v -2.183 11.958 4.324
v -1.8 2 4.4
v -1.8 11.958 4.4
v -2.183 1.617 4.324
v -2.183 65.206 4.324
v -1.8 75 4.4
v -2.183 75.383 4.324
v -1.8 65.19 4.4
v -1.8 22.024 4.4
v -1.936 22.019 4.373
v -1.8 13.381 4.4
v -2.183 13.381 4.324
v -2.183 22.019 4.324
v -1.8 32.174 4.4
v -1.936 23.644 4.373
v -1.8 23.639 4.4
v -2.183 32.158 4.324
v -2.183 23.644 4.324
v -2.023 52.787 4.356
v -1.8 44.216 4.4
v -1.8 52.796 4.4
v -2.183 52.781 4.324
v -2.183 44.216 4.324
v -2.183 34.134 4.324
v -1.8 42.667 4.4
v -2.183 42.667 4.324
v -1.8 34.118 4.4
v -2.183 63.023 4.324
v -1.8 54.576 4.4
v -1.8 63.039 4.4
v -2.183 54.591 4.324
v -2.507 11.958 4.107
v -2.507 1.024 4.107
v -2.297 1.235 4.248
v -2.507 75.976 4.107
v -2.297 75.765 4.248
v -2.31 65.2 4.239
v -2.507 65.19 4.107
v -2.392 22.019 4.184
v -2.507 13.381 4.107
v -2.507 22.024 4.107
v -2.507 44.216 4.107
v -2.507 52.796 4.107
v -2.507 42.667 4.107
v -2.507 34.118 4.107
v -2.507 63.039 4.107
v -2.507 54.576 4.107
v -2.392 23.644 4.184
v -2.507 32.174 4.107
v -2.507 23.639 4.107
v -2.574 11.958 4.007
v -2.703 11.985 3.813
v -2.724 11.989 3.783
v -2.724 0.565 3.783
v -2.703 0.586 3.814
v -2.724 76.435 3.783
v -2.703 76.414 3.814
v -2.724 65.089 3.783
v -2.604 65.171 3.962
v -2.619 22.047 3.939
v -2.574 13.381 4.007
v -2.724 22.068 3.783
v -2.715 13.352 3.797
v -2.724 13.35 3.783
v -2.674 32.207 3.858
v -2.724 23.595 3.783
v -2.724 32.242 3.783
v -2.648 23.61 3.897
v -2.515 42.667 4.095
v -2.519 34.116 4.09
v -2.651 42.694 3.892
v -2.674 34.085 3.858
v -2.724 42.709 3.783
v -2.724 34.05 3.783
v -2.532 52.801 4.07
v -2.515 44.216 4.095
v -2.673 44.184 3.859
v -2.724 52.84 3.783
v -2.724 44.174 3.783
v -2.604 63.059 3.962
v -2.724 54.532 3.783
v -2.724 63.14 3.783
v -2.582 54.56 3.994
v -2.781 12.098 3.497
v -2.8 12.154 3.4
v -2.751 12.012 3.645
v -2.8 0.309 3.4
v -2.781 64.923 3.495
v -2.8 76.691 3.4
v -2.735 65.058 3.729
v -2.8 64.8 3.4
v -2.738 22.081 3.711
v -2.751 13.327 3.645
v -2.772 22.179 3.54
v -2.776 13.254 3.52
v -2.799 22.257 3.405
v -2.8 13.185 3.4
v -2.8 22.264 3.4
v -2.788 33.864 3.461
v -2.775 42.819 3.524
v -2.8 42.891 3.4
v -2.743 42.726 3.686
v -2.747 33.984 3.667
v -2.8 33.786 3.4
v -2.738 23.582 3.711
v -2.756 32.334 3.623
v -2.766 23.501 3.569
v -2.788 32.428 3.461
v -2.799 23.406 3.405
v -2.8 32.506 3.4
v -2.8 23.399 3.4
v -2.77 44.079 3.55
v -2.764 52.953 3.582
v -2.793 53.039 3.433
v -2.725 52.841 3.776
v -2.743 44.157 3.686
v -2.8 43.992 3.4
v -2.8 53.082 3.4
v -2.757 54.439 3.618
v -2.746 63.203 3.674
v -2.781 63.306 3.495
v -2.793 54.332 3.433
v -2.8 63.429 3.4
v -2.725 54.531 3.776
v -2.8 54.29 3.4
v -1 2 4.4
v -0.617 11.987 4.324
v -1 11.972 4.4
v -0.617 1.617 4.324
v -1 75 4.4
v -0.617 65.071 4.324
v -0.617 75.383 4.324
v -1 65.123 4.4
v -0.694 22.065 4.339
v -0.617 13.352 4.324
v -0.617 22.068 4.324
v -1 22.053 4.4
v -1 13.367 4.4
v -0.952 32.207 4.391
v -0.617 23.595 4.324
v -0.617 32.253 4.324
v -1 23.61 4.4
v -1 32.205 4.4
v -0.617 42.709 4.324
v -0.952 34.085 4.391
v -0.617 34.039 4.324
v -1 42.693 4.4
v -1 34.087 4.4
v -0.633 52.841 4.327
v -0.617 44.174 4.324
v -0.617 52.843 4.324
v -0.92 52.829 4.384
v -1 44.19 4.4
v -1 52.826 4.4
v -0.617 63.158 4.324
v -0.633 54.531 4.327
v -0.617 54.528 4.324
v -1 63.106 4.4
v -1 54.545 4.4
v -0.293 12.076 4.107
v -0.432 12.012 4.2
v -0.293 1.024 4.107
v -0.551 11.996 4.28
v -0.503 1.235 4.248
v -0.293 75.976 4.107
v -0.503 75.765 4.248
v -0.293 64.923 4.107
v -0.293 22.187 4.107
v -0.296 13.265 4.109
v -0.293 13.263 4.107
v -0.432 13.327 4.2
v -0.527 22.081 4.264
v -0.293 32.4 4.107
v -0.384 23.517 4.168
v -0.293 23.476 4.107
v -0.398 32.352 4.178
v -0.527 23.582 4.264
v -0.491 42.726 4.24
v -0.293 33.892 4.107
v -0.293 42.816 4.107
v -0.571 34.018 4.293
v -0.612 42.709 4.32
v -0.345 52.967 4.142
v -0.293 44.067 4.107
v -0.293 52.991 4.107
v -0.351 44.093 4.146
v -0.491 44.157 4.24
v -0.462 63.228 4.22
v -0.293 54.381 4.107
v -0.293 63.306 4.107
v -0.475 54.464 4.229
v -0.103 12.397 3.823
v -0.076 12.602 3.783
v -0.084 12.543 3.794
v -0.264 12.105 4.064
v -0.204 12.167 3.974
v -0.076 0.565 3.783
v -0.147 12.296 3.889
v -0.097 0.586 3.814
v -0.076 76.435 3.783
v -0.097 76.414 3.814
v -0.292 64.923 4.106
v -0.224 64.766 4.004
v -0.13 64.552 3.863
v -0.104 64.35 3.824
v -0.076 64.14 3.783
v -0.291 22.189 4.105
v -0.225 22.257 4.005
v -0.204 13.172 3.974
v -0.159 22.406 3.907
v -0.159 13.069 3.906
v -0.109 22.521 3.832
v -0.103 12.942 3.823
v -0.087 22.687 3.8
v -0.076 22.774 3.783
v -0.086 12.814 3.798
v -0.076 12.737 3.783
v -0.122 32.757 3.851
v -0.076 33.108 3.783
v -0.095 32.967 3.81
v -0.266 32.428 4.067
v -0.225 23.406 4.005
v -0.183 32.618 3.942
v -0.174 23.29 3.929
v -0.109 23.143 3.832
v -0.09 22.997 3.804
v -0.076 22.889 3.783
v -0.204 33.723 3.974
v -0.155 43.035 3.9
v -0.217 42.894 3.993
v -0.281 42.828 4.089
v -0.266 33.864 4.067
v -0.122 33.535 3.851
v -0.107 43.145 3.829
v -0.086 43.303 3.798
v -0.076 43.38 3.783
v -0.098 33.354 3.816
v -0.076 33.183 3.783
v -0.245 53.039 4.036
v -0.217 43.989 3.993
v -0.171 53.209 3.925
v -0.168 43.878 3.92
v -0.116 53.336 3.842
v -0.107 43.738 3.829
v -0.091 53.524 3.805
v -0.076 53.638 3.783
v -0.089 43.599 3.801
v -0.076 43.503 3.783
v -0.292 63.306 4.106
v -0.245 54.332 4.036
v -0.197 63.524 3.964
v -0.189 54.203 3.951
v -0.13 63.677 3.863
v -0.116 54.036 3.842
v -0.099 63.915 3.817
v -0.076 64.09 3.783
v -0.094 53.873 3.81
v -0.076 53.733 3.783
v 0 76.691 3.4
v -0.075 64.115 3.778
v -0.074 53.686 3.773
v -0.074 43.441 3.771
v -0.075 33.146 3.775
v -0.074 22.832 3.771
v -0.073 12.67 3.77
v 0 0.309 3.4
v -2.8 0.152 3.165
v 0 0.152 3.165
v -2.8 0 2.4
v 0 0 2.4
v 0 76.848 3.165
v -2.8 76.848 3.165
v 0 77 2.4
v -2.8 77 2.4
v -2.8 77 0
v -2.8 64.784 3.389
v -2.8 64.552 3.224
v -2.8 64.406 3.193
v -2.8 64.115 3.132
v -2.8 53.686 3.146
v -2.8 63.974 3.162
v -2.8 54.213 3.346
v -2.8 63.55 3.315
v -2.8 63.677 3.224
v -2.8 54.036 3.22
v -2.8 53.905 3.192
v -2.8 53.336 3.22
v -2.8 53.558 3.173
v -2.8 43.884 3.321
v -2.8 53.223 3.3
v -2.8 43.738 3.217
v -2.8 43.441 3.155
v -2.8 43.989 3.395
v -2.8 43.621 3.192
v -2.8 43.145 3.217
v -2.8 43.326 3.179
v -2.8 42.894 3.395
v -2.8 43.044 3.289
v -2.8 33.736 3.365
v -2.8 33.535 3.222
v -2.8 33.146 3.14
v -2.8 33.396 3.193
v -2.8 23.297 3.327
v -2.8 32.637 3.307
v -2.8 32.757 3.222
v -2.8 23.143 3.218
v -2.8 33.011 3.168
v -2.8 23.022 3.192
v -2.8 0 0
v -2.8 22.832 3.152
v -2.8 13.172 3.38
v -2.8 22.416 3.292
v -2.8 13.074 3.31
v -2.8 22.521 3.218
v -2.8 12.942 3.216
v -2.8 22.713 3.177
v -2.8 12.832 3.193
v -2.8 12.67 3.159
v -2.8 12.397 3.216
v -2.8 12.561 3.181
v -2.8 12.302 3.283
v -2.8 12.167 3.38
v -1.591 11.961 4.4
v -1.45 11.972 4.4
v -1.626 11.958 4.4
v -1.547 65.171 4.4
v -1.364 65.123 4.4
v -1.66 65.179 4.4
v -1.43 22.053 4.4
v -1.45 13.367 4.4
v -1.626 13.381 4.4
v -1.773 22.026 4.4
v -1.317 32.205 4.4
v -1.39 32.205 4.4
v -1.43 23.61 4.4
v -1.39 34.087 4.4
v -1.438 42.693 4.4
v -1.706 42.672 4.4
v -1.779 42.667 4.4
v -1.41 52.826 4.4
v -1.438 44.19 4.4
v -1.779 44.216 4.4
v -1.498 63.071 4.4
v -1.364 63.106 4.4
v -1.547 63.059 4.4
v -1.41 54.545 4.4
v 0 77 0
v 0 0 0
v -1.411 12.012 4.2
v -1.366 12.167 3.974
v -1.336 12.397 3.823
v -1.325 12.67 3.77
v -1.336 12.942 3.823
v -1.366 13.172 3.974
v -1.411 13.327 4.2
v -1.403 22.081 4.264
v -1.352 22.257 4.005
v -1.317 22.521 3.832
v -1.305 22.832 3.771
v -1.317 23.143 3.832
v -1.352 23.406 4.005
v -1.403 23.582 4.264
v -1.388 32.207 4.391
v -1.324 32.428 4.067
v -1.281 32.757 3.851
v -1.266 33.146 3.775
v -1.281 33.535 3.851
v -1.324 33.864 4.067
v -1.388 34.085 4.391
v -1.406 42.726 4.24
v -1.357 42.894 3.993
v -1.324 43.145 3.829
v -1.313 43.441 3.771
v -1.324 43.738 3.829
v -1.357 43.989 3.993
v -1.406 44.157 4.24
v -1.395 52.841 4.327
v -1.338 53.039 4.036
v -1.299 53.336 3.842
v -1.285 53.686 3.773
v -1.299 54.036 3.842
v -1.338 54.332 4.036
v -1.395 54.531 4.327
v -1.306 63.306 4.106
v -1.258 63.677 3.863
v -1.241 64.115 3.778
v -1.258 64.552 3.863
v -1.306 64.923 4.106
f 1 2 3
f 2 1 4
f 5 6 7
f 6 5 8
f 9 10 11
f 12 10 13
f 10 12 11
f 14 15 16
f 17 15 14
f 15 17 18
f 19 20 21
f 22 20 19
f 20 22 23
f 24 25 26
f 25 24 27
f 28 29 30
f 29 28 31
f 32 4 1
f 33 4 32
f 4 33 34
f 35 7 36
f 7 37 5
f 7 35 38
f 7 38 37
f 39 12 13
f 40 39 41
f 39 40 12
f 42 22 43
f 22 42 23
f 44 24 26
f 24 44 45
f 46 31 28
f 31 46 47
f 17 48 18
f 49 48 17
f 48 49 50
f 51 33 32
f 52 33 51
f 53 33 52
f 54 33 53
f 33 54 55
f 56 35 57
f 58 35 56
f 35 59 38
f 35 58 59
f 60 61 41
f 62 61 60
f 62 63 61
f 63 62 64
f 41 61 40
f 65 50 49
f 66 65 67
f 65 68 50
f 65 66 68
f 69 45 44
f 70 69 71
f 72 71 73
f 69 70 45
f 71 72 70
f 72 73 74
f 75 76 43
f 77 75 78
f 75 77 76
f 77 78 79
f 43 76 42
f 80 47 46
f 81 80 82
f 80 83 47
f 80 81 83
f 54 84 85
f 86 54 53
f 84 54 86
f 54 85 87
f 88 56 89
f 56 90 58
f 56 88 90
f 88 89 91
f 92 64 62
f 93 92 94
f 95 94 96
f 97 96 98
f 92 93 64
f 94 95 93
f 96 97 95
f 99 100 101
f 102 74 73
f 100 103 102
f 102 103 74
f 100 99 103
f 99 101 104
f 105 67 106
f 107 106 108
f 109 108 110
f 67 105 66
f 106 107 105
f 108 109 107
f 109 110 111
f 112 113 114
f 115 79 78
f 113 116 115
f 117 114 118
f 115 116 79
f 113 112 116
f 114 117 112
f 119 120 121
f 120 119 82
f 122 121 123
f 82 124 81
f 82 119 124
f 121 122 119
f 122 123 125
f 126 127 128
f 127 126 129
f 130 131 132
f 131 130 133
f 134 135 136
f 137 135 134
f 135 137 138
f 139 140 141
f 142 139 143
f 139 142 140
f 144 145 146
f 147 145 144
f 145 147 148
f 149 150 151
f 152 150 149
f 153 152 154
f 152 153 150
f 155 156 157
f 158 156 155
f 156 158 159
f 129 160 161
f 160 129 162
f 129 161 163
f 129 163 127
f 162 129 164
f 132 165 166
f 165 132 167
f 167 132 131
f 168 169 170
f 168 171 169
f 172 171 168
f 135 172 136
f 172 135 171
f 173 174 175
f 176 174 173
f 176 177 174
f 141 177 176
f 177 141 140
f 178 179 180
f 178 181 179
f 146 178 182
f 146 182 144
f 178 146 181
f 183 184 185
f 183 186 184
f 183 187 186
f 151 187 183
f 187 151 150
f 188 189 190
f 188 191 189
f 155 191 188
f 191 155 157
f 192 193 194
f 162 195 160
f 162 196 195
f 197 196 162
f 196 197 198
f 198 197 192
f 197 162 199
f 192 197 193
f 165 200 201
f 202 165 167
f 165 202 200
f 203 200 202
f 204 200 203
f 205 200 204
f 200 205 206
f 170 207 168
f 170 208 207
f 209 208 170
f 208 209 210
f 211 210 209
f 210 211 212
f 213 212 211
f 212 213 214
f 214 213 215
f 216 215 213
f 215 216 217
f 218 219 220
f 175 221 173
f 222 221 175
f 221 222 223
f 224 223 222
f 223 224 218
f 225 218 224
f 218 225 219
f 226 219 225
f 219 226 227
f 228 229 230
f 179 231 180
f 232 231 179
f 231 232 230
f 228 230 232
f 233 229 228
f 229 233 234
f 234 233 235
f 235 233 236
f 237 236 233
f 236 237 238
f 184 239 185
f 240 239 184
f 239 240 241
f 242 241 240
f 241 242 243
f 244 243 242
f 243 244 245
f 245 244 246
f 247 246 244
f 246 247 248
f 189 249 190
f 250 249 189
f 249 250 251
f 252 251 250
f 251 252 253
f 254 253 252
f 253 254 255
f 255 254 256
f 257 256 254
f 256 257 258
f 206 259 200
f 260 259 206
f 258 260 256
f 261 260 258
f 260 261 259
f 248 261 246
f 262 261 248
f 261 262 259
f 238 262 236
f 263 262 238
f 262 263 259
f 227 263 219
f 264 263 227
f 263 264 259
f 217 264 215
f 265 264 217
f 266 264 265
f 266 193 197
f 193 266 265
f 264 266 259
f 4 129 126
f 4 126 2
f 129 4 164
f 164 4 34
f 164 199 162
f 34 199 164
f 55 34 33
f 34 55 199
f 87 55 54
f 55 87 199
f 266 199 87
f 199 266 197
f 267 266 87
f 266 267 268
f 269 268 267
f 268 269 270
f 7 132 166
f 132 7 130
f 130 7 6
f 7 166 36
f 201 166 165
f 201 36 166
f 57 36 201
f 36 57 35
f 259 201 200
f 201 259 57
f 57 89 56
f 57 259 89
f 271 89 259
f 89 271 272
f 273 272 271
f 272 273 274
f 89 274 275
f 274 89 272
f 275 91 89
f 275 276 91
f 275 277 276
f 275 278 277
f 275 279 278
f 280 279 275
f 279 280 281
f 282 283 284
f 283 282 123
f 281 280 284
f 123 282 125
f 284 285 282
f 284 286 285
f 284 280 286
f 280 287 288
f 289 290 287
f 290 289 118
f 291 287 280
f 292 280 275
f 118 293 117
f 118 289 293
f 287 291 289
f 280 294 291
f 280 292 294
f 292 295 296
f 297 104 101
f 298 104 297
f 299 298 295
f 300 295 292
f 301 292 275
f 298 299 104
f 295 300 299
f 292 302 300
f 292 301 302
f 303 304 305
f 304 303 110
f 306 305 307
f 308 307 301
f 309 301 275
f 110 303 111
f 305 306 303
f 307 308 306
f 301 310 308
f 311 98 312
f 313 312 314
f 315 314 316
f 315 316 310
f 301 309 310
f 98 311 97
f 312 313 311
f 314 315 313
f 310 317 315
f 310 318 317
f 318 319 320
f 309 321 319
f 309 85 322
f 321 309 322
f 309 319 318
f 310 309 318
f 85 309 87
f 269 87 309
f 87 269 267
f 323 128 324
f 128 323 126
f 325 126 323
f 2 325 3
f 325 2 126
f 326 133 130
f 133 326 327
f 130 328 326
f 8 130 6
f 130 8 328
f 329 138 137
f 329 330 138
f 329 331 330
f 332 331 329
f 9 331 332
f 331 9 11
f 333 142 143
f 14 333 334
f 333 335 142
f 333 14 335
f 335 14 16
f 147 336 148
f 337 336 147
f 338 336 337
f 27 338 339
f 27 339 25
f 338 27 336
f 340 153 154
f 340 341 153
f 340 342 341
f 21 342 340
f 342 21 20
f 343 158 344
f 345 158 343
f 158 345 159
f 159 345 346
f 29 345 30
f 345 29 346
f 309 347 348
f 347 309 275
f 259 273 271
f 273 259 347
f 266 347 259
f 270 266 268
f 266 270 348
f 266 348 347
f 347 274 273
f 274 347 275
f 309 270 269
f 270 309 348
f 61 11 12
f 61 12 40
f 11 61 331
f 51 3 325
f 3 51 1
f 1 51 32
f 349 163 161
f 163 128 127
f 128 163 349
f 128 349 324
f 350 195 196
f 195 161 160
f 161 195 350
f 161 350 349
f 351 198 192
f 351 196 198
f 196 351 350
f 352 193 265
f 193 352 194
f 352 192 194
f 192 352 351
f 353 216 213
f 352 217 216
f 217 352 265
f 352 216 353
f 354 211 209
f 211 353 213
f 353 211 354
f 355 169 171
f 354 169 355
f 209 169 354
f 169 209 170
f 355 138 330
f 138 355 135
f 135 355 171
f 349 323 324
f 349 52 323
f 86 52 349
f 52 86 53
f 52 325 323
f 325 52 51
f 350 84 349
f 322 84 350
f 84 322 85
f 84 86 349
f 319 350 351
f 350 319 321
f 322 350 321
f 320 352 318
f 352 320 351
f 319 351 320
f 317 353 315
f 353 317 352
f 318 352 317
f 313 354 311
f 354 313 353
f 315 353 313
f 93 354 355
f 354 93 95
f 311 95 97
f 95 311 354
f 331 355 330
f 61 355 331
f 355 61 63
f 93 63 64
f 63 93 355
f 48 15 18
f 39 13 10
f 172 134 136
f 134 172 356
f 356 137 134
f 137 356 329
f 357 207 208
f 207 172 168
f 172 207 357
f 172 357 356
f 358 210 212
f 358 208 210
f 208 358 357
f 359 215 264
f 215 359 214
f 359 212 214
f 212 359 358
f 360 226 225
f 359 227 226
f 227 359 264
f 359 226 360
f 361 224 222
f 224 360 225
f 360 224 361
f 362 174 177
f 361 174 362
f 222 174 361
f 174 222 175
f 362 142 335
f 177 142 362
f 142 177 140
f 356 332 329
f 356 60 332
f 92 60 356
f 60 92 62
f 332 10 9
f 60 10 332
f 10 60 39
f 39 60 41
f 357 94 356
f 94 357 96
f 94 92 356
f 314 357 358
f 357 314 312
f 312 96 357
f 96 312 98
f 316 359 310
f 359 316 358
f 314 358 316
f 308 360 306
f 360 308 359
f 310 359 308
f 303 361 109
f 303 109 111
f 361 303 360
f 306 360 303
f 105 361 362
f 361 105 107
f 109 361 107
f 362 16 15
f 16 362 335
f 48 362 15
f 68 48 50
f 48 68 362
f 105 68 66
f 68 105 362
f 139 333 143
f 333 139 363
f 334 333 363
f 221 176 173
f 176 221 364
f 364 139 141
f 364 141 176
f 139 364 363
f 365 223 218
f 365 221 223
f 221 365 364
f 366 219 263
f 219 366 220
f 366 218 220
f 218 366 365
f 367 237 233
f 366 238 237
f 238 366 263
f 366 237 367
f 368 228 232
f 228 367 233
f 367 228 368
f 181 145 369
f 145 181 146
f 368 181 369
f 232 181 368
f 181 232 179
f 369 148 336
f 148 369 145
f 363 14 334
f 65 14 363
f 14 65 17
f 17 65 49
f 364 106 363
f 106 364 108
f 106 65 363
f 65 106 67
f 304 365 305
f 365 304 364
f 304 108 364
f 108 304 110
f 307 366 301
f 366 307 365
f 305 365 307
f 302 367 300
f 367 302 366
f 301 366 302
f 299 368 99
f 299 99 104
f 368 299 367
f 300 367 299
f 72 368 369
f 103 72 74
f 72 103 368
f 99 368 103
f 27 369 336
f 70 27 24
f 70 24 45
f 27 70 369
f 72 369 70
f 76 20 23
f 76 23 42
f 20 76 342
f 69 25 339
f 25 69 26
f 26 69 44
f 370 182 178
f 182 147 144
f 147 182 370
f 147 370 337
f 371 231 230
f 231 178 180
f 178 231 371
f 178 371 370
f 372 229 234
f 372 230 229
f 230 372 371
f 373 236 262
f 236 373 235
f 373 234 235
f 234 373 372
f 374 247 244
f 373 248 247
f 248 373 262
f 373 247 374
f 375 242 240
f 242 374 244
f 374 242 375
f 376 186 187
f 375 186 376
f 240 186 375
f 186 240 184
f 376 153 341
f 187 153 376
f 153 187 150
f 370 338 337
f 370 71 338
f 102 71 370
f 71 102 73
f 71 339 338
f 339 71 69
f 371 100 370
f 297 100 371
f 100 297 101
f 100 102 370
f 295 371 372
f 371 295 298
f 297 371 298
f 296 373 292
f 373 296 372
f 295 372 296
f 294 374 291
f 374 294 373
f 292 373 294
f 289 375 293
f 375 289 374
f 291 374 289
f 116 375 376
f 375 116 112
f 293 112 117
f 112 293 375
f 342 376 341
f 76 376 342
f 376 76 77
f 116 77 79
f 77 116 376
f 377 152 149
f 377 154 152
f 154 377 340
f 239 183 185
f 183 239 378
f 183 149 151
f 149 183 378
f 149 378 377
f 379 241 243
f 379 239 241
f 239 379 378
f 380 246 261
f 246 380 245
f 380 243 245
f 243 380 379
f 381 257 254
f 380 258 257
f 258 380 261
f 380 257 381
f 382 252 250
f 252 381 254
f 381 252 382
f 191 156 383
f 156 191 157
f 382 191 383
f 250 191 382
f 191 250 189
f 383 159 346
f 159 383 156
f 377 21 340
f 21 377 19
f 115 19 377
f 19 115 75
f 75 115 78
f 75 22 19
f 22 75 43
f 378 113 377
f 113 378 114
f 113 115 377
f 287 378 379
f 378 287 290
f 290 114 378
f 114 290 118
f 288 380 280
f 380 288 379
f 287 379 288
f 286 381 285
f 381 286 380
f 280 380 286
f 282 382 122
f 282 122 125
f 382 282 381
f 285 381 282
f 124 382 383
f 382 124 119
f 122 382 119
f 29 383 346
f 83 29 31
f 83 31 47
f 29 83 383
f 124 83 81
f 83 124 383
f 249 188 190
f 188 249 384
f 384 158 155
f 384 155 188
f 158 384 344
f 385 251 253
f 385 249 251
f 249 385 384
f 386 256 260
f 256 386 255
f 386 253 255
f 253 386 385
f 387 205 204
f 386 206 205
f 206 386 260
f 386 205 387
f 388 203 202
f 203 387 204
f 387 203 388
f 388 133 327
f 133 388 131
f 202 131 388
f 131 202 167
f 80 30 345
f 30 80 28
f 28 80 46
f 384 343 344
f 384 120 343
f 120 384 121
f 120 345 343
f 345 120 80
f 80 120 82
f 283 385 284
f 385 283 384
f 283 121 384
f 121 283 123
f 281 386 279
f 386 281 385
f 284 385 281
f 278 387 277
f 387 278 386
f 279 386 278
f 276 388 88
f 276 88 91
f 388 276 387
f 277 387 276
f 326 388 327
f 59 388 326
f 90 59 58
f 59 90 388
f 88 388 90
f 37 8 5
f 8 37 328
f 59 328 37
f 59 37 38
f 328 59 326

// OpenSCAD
// file: shapes.scad
// The invocation `hollow_cylinder(h, r0, r1)` produces a hollow cylinder
// with the height `h`, the inner radius `r0` and the outer radius `r1`.
// The base of the cylinder is placed at the origin and
// its height grows along the `z` axis.
module hollow_cylinder(h, r0, r1) {
  difference() {
    cylinder(h, r1, r1);
    translate([0, 0, - $e])
      cylinder(2 * $e + h, r0, r0);
  }
}

// The invocation `torus(r0, r1)` produces a torus
// with the toroidal radius (the distance
// from the center of mass of the torus
// to the centerline of the tube) `r0` and
// the poloidal radius (the distance
// from the centerline of the tube
// to the surface of the torus) `r1`.
// The center of mass of the torus is placed at the origin and
// the tube revolves around the `z` axis.
module torus(r0, r1) {
  translate([0, 0, - r1])
    rotate_extrude()
    translate([r0, r1, 0])
    circle(r1);
}
// file: nutsaddle.scad
use <functions.scad>
use <shapes.scad>

module block(x_part, y_part, z_part) {
  cube([x_part, y_part, z_part]);
}

module fillet(r, a) {
  translate([- r, 0, - r])
    difference() {
      translate([0, - $e, 0])
        cube([$e + r, 2 * $e + a, $e + r]);
      translate([0, - 2 * $e, 0])
        rotate([- 90, 0, 0])
        cylinder(4 * $e + a, r, r);
    }
}

module filleted_block(x_part, y_part, z_part, r_anchor, r_neck, r_side) {
  difference() {
    block(x_part, y_part, z_part);
    translate([x_part, 0, z_part])
      fillet(r_anchor, y_part);
    translate([0, 0, z_part])
      mirror([1, 0, 0])
      fillet(r_neck, y_part);
    translate([0, 0, z_part])
      rotate([0, 0, - 90])
      fillet(r_side, x_part);
    translate([0, y_part, z_part])
      mirror([0, 1, 0])
      rotate([0, 0, - 90])
      fillet(r_side, x_part);
  }
}

module groove(z_part, y_grooves, r_grooves, i) {
  let (y_groove = y_grooves[i], r_groove = r_grooves[i])
    translate([0, 0, z_part + y_groove - r_groove])
    rotate([90, 0, 0])
    let (h = y_groove, r0 = r_groove, r1 = z_part + r_groove)
    difference() {
      /// This rotation is here just to accommodate low values of `$fn`.
      rotate([0, 0, 180 / $fn]) {
        translate([0, 0, - h])
          hollow_cylinder(2 * h, r0, r1);
        torus(r0, h);
      }
      difference() {
        translate([- r1, - r1, - 2 * $e - h])
          cube([$e + 2 * r1, $e + 2 * r1, 4 * $e + 2 * h]);
        translate([- $e, 0, - 3 * $e - h])
          cube([3 * $e + r1, 2 * $e + r1, 6 * $e + 2 * h]);
      }
    }
}

module grooved_filleted_block(x_part, y_part, z_part,
    z_groove, y_grooves, y_steps, y_edge,
    alpha_grooves, r_grooves, r_anchor, r_neck, r_side) {
  let (y_grooves_sum = cumsum(y_grooves), y_steps_sum = cumsum(y_steps))
    difference() {
      filleted_block(x_part, y_part, z_part, r_anchor, r_neck, r_side);
      for (i = [0 : len(y_grooves) - 1])
        translate([0, y_edge + y_grooves_sum[i]
            + y_steps_sum[i] + y_grooves[i] / 2, - z_groove])
          groove(z_part, y_grooves, r_grooves, i);
    }
}
// file: functions.scad
// The invocation `rep(n, v, a)` produces `n` repetitions
// of the elements of the vector `v`,
// starting from the accumulator value `a`.
function rep(n, v, a = []) =
  0 < n ? rep(n - 1, v, concat(v, a)) : a;

// The invocation `rev(v, i, a)` reverses the order
// of the elements of the vector `v`,
// starting from the index `i` and the accumulator value `a`.
function rev(v, i = 0, a = []) =
  i < len(v) ? rev(v, 1 + i, concat([v[i]], a)) : a;

// The invocation `sum(v, i, a)` yields the sum
// of the elements of the vector `v`,
// starting from the index `i` and the accumulator value `a`.
function sum(v, i = 0, a = 0) =
  i < len(v) ? sum(v, 1 + i, a + v[i]) : a;

// The invocation `cumsum(v, i, a)` yields a vector
// of the cumulative partial sums of the elements of the vector `v`,
// starting from the index `i` and the accumulator value `a`.
function cumsum(v, i = 0, a = 0) =
  i < len(v) ? concat([a], cumsum(v, 1 + i, a + v[i])) : a;
// main file
$e = 0.01;
$fn = 16;

use <functions.scad>
use <nutsaddle.scad>

/// Depth of the part (along the neck).
x_part = 2.8;
/// Width of the part (across the neck).
y_part = 76.8 + 0.2;
/// Height of the part (through the neck).
/// TODO Try to drop this by 3.6 to adjust the action.
z_part = 8.0 - 3.6;

/// How much shallower the grooves should be to account for wear.
z_extra = 0.0;
/// Depths of the grooves on the sharp edge (with room to accommodate wear).
z_groove = 0.5 - z_extra;
echo(z_groove = z_groove);
assert(z_groove < z_part,
    "Grooves are deeper than they should be!");
/// How much fitting room the strings should have.
d_extra = 0.0;
/// Diameters of the strings.
d_strings = [0.7112, 0.8128, 1.016, 0.7747, 0.9144, 1.143];
/// Widths of the grooves (with room to accommodate fitting).
y_grooves = [for (d_string = d_strings) d_extra + d_string];
echo(y_grooves = y_grooves);
/// Cumulative widths of the grooves.
y_grooves_sum = cumsum(y_grooves);
/// Distances between the grooves.
y_steps = rep(len(y_grooves) - 1, 9.4);
assert(1 + len(y_steps) == len(y_grooves),
    "Grooves are more or less numerous than they should be!");
/// Cumulative distances between the grooves.
y_steps_sum = cumsum(y_steps);
/// Distance between the first (and last) groove and the edge.
y_edge = (y_part - y_grooves_sum[len(y_grooves)]
    - y_steps_sum[len(y_grooves) - 1]) / 2;
echo(y_edge = y_edge);
assert(y_edge >= 0,
    "Grooves are wider than they should be!");

/// Angles at which the strings turn
/// from the neck towards their anchoring points.
alpha_anchors = [atan((13.0 - 5.6 - 8.0 + z_part)
    / (12 * cos(asin((13.0 - 5.6) / 12))))];
/// Angles at which the grooves turn.
alpha_grooves = rep(6, alpha_anchors);
echo(alpha_grooves = alpha_grooves);
assert(max(alpha_grooves) < 90,
    "Grooves turn more than they should!");
/// Radii of curvature of the grooves.
r_grooves = [for (alpha_groove = alpha_grooves) x_part / sin(alpha_groove)];
echo(r_grooves = r_grooves);
/// Radius of curvature of the round edge (farther away from the neck).
r_anchor = 1.0;
echo(r_anchor = r_anchor);
/// Radius of curvature of the sharp edge (closer to the neck).
r_neck = 1.0;
/// Radii of curvature of the sides.
r_side = 2.0;
assert(r_anchor + r_neck < x_part && 2 * r_side < y_part,
    "Fillets are larger than they should be!");

mirror([1, 0, 0])
  grooved_filleted_block(x_part, y_part, z_part,
      z_groove, y_grooves, y_steps, y_edge,
    alpha_grooves, r_grooves, r_anchor, r_neck, r_side);
